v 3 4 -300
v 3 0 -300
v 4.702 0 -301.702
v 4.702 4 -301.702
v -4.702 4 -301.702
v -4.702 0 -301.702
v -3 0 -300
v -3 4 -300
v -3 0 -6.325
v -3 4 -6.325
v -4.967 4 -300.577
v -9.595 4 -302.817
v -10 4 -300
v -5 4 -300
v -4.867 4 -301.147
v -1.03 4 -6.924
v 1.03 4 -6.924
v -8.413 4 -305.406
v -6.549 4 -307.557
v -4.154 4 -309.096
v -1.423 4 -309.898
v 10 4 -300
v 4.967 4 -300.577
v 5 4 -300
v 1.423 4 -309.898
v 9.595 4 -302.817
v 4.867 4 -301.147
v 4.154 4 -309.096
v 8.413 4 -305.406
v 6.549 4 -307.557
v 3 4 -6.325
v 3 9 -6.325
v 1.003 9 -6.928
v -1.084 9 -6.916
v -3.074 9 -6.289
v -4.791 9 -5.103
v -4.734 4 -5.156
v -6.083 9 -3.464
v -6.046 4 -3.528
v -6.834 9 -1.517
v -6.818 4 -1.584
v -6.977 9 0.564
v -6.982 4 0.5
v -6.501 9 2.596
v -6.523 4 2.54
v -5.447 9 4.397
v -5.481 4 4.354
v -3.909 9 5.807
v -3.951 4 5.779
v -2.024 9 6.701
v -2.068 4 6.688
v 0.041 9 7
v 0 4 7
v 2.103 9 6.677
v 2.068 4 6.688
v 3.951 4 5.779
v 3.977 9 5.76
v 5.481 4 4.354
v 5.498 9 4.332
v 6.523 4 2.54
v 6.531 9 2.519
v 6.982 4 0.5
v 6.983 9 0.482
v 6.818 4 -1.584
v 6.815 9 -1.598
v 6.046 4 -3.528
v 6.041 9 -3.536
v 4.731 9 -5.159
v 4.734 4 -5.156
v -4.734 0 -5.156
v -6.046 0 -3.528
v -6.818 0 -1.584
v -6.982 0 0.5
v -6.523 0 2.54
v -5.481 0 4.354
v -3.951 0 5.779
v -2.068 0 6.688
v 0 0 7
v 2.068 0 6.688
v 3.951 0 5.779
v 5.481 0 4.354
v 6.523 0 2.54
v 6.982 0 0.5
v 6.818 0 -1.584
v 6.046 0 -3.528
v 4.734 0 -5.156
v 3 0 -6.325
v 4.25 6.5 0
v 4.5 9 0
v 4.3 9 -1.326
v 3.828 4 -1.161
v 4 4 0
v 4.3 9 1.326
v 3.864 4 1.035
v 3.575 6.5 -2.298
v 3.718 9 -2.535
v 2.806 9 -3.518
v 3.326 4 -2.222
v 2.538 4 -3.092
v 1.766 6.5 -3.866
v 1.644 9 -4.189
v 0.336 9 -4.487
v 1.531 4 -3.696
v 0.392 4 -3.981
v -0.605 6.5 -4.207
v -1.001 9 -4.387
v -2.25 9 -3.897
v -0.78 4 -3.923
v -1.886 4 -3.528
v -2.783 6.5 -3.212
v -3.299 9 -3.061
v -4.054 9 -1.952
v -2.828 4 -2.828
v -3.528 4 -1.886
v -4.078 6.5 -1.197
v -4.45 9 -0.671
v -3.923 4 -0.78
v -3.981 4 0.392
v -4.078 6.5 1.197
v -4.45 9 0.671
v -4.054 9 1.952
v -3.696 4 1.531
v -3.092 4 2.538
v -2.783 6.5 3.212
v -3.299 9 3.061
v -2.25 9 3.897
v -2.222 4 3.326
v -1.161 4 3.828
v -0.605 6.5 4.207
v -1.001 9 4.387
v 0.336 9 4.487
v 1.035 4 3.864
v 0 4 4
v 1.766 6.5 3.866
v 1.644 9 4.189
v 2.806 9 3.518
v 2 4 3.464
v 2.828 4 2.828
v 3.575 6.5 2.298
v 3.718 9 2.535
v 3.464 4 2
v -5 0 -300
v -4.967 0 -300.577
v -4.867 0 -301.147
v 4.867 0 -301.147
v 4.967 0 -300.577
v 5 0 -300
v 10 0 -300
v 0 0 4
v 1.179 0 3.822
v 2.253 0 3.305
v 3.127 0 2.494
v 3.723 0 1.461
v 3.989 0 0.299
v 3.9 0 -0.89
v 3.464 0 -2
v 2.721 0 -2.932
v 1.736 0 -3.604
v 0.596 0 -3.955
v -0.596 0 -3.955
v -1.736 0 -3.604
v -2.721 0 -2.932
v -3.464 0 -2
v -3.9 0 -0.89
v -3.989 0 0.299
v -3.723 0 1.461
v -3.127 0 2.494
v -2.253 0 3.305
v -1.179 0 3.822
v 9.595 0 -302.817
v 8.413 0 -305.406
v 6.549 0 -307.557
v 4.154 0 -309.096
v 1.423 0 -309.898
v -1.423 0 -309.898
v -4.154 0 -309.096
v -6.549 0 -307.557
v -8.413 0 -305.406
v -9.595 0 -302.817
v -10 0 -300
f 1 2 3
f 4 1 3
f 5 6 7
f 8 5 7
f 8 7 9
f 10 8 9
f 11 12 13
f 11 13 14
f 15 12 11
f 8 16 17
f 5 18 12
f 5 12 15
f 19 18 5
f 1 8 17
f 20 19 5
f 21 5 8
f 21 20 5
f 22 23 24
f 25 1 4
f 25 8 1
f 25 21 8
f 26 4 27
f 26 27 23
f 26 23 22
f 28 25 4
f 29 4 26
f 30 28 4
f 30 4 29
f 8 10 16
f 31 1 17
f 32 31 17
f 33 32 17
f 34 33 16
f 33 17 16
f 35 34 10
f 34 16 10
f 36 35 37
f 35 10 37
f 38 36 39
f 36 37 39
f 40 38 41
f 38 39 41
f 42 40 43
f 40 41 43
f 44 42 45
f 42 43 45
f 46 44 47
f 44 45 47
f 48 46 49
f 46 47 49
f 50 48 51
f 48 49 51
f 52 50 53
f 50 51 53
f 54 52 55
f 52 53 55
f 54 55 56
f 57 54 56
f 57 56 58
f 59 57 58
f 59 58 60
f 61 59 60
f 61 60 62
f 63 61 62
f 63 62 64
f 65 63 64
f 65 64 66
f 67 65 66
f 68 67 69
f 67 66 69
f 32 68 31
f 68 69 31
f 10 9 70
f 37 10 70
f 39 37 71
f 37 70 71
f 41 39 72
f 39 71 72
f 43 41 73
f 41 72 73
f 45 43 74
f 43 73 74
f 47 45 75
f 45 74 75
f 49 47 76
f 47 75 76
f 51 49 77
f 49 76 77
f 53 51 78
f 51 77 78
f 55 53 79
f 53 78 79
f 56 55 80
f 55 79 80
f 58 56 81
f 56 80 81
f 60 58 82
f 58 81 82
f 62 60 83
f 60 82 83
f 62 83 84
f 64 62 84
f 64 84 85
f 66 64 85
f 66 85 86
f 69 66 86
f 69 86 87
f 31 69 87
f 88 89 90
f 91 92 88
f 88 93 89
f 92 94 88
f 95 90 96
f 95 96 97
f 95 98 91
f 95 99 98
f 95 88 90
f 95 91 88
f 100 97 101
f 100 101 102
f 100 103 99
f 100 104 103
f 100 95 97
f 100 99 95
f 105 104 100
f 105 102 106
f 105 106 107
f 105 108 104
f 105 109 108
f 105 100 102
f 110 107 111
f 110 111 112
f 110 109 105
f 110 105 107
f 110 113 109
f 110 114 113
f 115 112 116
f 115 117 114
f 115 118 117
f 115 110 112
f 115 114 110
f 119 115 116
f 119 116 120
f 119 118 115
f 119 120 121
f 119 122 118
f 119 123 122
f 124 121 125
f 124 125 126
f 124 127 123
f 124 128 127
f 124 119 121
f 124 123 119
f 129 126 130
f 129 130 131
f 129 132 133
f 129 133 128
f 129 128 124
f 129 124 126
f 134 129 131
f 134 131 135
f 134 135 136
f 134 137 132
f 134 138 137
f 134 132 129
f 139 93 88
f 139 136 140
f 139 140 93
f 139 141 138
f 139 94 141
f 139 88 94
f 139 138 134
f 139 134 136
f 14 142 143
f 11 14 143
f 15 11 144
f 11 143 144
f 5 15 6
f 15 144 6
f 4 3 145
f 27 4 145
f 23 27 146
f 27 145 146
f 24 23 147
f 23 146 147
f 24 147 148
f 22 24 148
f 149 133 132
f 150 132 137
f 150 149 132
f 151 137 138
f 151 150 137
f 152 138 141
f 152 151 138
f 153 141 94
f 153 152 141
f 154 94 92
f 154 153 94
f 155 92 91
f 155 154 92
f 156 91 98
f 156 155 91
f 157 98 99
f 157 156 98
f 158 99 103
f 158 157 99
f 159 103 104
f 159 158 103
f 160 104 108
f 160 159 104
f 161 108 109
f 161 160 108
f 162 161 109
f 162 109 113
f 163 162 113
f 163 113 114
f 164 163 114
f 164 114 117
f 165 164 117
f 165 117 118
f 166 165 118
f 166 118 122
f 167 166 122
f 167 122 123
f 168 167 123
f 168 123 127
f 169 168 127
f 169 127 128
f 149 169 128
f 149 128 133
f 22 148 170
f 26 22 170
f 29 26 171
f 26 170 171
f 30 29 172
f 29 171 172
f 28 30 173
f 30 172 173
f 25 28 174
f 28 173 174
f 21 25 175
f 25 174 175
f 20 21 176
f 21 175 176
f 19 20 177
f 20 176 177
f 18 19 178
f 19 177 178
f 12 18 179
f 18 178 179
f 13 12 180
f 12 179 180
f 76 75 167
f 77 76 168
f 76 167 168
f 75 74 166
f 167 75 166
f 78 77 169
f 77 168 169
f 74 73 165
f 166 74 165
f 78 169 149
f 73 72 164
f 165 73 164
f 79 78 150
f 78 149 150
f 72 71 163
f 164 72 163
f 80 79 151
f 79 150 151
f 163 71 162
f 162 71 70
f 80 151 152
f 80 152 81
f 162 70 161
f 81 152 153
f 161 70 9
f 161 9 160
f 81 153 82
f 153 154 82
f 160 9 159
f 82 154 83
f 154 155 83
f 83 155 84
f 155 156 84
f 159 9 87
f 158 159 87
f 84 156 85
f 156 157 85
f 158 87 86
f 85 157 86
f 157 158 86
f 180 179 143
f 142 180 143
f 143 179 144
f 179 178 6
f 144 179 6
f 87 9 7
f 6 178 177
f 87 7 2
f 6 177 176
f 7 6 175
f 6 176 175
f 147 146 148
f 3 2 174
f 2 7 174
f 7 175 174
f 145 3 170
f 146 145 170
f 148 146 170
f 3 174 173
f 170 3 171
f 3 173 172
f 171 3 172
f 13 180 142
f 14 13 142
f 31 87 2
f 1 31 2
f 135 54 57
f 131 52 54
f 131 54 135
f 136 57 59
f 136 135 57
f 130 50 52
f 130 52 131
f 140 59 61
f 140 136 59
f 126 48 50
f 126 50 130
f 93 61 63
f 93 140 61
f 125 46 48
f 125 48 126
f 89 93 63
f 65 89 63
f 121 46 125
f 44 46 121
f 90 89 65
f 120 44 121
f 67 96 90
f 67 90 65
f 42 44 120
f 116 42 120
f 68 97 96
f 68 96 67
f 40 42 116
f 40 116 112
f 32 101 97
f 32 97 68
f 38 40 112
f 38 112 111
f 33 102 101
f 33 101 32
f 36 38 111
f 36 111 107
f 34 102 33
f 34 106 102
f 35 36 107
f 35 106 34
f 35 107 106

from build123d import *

# Parameters (mm, degrees)
SKETCH1_R           = 4
BOSS_EXTRUDE1_DEPTH = 4
SKETCH4_R           = 7
BOSS_EXTRUDE2_DEPTH = 5
SKETCH2_R           = 4.5
SKETCH3_R           = 4


with BuildPart() as part:
    # Sketch1 → Boss-Extrude1 (new body)
    with BuildSketch(Plane(origin=(0, 0, 0), x_dir=(1, 0, 0), z_dir=(0, 1, 0))):
        with BuildLine():
            Line((-3, 300), (-3, 6.32455532))
            ThreePointArc((-3, 6.32455532), (0, -7), (3, 6.32455532))
            Line((3, 6.32455532), (3, 300))
            Line((3, 300), (4.701562119, 301.701562119))
            ThreePointArc((4.701562119, 301.701562119), (4.924825408, 300.863767737), (5, 300))
            Line((5, 300), (10, 300))
            ThreePointArc((10, 300), (0, 310), (-10, 300))
            Line((-10, 300), (-5, 300))
            ThreePointArc((-5, 300), (-4.924825408, 300.863767737), (-4.701562119, 301.701562119))
            Line((-4.701562119, 301.701562119), (-3, 300))
        make_face()
        with Locations(Location((0, 0, 0), (0, 0, 270))):
            Circle(SKETCH1_R, mode=Mode.SUBTRACT)
    extrude(amount=BOSS_EXTRUDE1_DEPTH)

    # Sketch4 → Boss-Extrude2 (add)
    with BuildSketch(Plane(origin=(0, 4, 0), x_dir=(1, 0, 0), z_dir=(0, 1, 0))):
        with Locations(Location((0, 0, 0), (0, 0, 64.623066475))):
            Circle(SKETCH4_R)
    extrude(amount=BOSS_EXTRUDE2_DEPTH)

    # Sketch2 → Cut-Loft1 section 0
    with BuildSketch(Plane(origin=(0, 9, 0), x_dir=(1, 0, 0), z_dir=(0, 1, 0))):
        Circle(SKETCH2_R)
    # Sketch3 → Cut-Loft1 section 1
    with BuildSketch(Plane(origin=(0, 4, 0), x_dir=(1, 0, 0), z_dir=(0, 1, 0))):
        Circle(SKETCH3_R)
    loft(mode=Mode.SUBTRACT)


solid = part.part
